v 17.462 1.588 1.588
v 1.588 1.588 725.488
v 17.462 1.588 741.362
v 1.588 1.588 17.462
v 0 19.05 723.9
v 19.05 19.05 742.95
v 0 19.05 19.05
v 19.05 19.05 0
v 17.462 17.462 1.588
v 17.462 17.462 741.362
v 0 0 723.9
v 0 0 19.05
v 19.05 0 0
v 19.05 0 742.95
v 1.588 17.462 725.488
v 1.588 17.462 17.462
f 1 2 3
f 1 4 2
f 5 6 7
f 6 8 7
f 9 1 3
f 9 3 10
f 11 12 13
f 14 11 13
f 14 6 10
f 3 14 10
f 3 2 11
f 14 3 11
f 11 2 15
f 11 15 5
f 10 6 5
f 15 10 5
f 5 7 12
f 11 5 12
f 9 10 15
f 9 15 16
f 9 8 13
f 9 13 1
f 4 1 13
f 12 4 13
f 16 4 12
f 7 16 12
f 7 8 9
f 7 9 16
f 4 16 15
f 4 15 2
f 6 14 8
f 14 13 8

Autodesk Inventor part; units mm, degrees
ref_plane "YZ Plane" through (0, 0, 0) normal (1, 0, 0) x (0, 1, 0)
ref_plane "XZ Plane" through (0, 0, 0) normal (0, 1, 0) x (-1, 0, 0)
ref_plane "XY Plane" through (0, 0, 0) normal (0, 0, 1) x (1, 0, 0)
sketch "Sketch1" plane through (0, 0, 0) normal (0, 0, 1) x (1, 0, 0)
  line L0 (0, 0) -> (19.05, 0)
  line L1 (19.05, 0) -> (19.05, 19.05)
  line L2 (19.05, 19.05) -> (0, 19.05)
  line L3 (0, 19.05) -> (0, 0)
  line L4 (17.4625, 17.4625) -> (1.5875, 17.4625)
  line L5 (1.5875, 17.4625) -> (1.5875, 1.5875)
  line L6 (1.5875, 1.5875) -> (17.4625, 1.5875)
  line L7 (17.4625, 1.5875) -> (17.4625, 17.4625)
  dimension "d0" = 19.05
  dimension "d1" = 19.05
  dimension "d2" = 1.5875
  dimension "d3" = 1.5875
  dimension "d4" = 1.5875
  dimension "d5" = 1.5875
extrude "Extrusion1" add sketch "Sketch1" along normal blind 742.95
sketch "Sketch2" plane through (0, 19.05, 0) normal (0, 1, 0) x (1, 0, 0)
  line L0 (19.05, 0) -> (0, 0) projected
  line L1 (0, 0) -> (0, -742.95) projected
  line L2 (19.05, -742.95) -> (0, -742.95) projected
  line L3 (19.05, -742.95) -> (0, -723.9)
  line L4 (19.05, 0) -> (0, -19.05)
  dimension "d8" = 45
  dimension "d9" = 45
extrude "Extrusion2" cut sketch "Sketch2" against normal through all
equation "\"d3\" = d2"
equation "\"d4\" = d2"
equation "\"d5\" = d3"
properties part number "Bumper Rail Side"
